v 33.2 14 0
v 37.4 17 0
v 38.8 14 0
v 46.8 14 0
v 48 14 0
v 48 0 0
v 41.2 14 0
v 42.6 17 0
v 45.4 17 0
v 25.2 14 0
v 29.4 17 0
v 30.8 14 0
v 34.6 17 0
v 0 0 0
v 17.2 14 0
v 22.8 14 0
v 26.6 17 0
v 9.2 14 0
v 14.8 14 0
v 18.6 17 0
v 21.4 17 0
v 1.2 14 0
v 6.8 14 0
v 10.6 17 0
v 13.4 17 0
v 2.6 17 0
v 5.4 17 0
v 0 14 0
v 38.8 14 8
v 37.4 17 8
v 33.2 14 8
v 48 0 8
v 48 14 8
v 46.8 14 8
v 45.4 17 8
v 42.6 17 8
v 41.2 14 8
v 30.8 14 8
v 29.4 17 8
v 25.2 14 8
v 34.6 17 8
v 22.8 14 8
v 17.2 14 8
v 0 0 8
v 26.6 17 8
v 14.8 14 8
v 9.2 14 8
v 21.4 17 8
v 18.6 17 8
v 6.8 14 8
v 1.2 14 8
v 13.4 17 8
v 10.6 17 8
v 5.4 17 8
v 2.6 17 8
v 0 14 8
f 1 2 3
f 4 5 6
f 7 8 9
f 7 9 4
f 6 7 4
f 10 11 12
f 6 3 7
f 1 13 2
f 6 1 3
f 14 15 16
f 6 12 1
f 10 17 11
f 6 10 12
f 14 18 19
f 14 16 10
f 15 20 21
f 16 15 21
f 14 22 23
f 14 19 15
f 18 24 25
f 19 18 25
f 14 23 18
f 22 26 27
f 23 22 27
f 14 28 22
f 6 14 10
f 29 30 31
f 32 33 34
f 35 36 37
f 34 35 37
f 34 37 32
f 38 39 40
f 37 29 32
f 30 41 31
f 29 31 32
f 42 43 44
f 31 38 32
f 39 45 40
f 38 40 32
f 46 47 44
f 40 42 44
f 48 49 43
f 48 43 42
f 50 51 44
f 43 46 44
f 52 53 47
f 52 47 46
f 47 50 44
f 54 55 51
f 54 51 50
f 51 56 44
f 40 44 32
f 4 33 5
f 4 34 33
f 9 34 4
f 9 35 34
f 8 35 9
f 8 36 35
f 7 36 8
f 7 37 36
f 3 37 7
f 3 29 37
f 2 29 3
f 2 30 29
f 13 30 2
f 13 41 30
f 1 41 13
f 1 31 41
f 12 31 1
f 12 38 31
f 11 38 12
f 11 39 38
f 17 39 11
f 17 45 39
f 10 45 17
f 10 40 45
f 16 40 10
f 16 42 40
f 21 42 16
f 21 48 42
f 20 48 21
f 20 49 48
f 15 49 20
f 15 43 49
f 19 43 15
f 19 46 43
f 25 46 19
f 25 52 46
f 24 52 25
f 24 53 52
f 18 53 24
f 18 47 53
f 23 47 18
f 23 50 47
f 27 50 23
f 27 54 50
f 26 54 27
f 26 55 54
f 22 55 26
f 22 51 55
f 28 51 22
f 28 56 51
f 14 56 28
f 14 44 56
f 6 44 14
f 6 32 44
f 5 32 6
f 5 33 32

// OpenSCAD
$fn = 32;

// ----------------------------------------------------------------------
// Gear rack: 6 teeth, pitch 8 mm
// ----------------------------------------------------------------------

// --- parameters (mm) ---
teeth = 6;                // number of teeth
pitch = 8;                // tooth pitch, X
root_w = 5.6;             // tooth width at the root
tip_w = 2.8;              // tooth width at the tip
base_h = 14;              // rack body height, Y
tooth_h = 3;              // tooth height above the body
plate_t = 8;              // rack width, Z (extrusion height)

rack_l = teeth * pitch;  // overall length
total_h = base_h + tooth_h;  // overall height

profile = [[0, 0], [48, 0], [48, 14], [46.8, 14], [45.4, 17], [42.6, 17], [41.2, 14], [38.8, 14], [37.4, 17], [34.6, 17], [33.2, 14], [30.8, 14], [29.4, 17], [26.6, 17], [25.2, 14], [22.8, 14], [21.4, 17], [18.6, 17], [17.2, 14], [14.8, 14], [13.4, 17], [10.6, 17], [9.2, 14], [6.8, 14], [5.4, 17], [2.6, 17], [1.2, 14], [0, 14]];  // primary outline, 28 points, counter clockwise

// --- the one profile operation ---
linear_extrude(height = plate_t) polygon(points = profile);
